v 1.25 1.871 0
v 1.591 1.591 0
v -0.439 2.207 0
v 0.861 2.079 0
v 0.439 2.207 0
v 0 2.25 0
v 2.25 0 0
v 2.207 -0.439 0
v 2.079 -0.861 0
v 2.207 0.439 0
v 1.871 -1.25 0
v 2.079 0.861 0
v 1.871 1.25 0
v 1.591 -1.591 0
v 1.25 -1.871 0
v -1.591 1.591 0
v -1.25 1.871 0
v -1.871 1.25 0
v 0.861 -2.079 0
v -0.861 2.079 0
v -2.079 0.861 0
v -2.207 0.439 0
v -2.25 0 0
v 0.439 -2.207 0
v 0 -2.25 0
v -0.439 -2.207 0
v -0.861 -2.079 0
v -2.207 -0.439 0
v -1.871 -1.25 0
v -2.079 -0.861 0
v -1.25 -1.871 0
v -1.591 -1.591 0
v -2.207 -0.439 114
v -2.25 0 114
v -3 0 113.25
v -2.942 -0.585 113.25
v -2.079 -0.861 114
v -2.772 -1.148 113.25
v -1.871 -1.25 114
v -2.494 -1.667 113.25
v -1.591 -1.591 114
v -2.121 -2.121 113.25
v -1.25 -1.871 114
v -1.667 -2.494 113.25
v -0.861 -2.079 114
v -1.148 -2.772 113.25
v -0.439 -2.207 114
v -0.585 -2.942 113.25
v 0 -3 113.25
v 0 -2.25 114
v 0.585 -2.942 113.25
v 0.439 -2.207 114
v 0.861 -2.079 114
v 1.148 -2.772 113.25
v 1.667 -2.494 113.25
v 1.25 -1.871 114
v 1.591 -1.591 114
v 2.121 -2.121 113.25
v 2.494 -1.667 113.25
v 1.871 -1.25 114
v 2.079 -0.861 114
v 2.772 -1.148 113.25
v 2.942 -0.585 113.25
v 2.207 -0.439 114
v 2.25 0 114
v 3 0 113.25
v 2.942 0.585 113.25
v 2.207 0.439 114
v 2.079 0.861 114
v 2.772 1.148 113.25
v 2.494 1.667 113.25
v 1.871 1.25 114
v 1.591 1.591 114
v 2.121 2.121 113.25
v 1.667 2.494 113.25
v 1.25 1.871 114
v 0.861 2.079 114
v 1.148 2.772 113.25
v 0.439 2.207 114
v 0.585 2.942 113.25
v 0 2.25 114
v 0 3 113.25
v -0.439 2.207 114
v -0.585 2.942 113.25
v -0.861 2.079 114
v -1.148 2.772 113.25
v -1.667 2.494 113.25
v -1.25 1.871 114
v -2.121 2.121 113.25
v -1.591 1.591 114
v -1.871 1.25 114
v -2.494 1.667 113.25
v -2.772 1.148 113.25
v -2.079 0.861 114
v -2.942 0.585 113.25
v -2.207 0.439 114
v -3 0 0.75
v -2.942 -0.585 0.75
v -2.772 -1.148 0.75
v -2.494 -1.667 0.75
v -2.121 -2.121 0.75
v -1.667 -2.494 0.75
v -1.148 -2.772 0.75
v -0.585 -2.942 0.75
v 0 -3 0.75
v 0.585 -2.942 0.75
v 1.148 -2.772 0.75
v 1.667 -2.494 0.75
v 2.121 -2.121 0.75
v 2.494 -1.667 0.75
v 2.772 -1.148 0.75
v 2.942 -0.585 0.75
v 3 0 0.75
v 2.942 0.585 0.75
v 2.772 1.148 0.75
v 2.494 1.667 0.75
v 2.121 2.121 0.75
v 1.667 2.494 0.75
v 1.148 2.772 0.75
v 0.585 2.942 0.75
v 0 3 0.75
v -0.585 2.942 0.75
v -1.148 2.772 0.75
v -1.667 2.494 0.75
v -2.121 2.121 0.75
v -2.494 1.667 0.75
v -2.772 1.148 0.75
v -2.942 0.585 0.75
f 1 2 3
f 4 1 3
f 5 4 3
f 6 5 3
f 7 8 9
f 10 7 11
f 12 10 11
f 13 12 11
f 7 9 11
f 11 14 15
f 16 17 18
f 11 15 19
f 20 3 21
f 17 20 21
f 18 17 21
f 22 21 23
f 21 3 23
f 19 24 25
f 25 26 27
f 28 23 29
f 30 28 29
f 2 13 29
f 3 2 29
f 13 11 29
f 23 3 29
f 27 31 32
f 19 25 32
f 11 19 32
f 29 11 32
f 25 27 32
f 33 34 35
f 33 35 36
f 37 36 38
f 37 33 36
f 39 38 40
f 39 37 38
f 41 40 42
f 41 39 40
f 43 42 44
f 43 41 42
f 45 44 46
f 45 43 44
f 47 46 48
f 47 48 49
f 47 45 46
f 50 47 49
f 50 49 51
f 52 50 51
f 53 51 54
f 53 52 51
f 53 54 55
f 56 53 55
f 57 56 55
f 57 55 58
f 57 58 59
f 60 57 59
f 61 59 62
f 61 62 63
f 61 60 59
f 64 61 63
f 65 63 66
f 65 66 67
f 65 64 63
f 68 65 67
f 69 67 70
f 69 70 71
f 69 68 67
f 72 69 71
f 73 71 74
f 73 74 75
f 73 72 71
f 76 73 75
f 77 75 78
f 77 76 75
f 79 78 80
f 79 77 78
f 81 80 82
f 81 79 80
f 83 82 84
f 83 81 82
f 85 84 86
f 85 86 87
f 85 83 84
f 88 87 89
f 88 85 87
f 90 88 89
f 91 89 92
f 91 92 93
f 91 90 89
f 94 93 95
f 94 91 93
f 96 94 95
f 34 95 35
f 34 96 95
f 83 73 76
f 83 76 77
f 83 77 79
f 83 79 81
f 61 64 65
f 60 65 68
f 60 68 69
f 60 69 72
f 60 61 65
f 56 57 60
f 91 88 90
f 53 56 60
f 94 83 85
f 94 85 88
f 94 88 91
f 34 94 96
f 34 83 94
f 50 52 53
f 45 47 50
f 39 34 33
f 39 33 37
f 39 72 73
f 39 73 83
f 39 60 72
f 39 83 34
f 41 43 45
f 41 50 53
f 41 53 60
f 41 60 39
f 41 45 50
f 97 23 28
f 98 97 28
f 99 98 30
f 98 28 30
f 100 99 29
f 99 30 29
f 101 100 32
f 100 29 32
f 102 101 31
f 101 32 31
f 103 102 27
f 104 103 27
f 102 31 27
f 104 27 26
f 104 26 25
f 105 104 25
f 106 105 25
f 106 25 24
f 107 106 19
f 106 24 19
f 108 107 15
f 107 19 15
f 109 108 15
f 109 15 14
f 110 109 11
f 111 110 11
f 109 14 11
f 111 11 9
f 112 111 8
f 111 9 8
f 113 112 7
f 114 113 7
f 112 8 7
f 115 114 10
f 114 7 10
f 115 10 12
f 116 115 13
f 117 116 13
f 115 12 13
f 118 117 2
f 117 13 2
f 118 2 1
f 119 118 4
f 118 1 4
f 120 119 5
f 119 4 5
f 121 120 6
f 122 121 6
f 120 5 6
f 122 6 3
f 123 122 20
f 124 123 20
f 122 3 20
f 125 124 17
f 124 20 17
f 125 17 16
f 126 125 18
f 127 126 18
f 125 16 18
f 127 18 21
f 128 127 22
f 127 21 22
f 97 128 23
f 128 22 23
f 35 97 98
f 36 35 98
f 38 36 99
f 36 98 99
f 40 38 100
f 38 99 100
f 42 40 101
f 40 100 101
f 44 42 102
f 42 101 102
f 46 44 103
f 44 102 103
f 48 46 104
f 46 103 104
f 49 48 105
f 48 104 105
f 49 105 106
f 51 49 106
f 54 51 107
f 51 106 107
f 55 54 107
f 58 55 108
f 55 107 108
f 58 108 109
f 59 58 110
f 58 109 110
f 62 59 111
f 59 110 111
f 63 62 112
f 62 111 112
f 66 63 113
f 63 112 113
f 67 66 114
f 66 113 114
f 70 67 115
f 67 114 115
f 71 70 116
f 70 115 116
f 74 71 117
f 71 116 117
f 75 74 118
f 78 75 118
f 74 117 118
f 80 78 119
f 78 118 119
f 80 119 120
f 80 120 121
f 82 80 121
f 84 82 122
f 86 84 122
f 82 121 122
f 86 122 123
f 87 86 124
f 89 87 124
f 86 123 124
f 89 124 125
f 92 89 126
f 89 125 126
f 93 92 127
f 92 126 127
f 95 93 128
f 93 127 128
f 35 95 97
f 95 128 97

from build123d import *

# Parameters (mm, degrees)
SKETCH1_R           = 3
BOSS_EXTRUDE1_DEPTH = 114
CHAMFER1_SIZE       = 0.75
CHAMFER2_SIZE       = 0.75


with BuildPart() as part:
    # Sketch1 → Boss-Extrude1 (new body)
    with BuildSketch(Plane.XY):
        with Locations(Location((0, 0, 0), (0, 0, 180))):
            Circle(SKETCH1_R)
    extrude(amount=BOSS_EXTRUDE1_DEPTH)

    # Chamfer1
    chamfer1_edges = [part.edges().sort_by_distance(p)[0] for p in [
        (3, 0, 0),
    ]]
    chamfer(chamfer1_edges, length=CHAMFER1_SIZE)

    # Chamfer2
    chamfer2_edges = [part.edges().sort_by_distance(p)[0] for p in [
        (3, 0, 114),
    ]]
    chamfer(chamfer2_edges, length=CHAMFER2_SIZE)


solid = part.part
